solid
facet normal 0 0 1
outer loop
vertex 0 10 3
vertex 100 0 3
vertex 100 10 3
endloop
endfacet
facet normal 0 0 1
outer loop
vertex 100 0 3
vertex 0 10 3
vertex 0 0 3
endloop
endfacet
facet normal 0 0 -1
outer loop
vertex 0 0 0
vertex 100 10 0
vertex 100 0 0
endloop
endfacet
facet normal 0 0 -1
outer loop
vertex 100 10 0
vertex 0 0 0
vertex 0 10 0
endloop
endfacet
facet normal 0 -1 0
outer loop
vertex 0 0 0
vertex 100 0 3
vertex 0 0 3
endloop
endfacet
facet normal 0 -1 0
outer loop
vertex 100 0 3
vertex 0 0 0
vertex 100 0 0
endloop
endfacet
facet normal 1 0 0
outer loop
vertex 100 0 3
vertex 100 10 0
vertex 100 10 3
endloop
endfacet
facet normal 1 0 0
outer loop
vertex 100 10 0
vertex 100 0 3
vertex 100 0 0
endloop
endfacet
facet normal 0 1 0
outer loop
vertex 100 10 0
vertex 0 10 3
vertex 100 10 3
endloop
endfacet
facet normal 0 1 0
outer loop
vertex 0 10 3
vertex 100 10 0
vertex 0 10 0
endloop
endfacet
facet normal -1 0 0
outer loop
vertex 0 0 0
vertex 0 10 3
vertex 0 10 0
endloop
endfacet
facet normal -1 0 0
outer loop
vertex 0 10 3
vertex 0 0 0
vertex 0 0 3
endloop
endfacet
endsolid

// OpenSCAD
length = 100;
thickness = 3;
width = 10;

cube([length, width, thickness]);
